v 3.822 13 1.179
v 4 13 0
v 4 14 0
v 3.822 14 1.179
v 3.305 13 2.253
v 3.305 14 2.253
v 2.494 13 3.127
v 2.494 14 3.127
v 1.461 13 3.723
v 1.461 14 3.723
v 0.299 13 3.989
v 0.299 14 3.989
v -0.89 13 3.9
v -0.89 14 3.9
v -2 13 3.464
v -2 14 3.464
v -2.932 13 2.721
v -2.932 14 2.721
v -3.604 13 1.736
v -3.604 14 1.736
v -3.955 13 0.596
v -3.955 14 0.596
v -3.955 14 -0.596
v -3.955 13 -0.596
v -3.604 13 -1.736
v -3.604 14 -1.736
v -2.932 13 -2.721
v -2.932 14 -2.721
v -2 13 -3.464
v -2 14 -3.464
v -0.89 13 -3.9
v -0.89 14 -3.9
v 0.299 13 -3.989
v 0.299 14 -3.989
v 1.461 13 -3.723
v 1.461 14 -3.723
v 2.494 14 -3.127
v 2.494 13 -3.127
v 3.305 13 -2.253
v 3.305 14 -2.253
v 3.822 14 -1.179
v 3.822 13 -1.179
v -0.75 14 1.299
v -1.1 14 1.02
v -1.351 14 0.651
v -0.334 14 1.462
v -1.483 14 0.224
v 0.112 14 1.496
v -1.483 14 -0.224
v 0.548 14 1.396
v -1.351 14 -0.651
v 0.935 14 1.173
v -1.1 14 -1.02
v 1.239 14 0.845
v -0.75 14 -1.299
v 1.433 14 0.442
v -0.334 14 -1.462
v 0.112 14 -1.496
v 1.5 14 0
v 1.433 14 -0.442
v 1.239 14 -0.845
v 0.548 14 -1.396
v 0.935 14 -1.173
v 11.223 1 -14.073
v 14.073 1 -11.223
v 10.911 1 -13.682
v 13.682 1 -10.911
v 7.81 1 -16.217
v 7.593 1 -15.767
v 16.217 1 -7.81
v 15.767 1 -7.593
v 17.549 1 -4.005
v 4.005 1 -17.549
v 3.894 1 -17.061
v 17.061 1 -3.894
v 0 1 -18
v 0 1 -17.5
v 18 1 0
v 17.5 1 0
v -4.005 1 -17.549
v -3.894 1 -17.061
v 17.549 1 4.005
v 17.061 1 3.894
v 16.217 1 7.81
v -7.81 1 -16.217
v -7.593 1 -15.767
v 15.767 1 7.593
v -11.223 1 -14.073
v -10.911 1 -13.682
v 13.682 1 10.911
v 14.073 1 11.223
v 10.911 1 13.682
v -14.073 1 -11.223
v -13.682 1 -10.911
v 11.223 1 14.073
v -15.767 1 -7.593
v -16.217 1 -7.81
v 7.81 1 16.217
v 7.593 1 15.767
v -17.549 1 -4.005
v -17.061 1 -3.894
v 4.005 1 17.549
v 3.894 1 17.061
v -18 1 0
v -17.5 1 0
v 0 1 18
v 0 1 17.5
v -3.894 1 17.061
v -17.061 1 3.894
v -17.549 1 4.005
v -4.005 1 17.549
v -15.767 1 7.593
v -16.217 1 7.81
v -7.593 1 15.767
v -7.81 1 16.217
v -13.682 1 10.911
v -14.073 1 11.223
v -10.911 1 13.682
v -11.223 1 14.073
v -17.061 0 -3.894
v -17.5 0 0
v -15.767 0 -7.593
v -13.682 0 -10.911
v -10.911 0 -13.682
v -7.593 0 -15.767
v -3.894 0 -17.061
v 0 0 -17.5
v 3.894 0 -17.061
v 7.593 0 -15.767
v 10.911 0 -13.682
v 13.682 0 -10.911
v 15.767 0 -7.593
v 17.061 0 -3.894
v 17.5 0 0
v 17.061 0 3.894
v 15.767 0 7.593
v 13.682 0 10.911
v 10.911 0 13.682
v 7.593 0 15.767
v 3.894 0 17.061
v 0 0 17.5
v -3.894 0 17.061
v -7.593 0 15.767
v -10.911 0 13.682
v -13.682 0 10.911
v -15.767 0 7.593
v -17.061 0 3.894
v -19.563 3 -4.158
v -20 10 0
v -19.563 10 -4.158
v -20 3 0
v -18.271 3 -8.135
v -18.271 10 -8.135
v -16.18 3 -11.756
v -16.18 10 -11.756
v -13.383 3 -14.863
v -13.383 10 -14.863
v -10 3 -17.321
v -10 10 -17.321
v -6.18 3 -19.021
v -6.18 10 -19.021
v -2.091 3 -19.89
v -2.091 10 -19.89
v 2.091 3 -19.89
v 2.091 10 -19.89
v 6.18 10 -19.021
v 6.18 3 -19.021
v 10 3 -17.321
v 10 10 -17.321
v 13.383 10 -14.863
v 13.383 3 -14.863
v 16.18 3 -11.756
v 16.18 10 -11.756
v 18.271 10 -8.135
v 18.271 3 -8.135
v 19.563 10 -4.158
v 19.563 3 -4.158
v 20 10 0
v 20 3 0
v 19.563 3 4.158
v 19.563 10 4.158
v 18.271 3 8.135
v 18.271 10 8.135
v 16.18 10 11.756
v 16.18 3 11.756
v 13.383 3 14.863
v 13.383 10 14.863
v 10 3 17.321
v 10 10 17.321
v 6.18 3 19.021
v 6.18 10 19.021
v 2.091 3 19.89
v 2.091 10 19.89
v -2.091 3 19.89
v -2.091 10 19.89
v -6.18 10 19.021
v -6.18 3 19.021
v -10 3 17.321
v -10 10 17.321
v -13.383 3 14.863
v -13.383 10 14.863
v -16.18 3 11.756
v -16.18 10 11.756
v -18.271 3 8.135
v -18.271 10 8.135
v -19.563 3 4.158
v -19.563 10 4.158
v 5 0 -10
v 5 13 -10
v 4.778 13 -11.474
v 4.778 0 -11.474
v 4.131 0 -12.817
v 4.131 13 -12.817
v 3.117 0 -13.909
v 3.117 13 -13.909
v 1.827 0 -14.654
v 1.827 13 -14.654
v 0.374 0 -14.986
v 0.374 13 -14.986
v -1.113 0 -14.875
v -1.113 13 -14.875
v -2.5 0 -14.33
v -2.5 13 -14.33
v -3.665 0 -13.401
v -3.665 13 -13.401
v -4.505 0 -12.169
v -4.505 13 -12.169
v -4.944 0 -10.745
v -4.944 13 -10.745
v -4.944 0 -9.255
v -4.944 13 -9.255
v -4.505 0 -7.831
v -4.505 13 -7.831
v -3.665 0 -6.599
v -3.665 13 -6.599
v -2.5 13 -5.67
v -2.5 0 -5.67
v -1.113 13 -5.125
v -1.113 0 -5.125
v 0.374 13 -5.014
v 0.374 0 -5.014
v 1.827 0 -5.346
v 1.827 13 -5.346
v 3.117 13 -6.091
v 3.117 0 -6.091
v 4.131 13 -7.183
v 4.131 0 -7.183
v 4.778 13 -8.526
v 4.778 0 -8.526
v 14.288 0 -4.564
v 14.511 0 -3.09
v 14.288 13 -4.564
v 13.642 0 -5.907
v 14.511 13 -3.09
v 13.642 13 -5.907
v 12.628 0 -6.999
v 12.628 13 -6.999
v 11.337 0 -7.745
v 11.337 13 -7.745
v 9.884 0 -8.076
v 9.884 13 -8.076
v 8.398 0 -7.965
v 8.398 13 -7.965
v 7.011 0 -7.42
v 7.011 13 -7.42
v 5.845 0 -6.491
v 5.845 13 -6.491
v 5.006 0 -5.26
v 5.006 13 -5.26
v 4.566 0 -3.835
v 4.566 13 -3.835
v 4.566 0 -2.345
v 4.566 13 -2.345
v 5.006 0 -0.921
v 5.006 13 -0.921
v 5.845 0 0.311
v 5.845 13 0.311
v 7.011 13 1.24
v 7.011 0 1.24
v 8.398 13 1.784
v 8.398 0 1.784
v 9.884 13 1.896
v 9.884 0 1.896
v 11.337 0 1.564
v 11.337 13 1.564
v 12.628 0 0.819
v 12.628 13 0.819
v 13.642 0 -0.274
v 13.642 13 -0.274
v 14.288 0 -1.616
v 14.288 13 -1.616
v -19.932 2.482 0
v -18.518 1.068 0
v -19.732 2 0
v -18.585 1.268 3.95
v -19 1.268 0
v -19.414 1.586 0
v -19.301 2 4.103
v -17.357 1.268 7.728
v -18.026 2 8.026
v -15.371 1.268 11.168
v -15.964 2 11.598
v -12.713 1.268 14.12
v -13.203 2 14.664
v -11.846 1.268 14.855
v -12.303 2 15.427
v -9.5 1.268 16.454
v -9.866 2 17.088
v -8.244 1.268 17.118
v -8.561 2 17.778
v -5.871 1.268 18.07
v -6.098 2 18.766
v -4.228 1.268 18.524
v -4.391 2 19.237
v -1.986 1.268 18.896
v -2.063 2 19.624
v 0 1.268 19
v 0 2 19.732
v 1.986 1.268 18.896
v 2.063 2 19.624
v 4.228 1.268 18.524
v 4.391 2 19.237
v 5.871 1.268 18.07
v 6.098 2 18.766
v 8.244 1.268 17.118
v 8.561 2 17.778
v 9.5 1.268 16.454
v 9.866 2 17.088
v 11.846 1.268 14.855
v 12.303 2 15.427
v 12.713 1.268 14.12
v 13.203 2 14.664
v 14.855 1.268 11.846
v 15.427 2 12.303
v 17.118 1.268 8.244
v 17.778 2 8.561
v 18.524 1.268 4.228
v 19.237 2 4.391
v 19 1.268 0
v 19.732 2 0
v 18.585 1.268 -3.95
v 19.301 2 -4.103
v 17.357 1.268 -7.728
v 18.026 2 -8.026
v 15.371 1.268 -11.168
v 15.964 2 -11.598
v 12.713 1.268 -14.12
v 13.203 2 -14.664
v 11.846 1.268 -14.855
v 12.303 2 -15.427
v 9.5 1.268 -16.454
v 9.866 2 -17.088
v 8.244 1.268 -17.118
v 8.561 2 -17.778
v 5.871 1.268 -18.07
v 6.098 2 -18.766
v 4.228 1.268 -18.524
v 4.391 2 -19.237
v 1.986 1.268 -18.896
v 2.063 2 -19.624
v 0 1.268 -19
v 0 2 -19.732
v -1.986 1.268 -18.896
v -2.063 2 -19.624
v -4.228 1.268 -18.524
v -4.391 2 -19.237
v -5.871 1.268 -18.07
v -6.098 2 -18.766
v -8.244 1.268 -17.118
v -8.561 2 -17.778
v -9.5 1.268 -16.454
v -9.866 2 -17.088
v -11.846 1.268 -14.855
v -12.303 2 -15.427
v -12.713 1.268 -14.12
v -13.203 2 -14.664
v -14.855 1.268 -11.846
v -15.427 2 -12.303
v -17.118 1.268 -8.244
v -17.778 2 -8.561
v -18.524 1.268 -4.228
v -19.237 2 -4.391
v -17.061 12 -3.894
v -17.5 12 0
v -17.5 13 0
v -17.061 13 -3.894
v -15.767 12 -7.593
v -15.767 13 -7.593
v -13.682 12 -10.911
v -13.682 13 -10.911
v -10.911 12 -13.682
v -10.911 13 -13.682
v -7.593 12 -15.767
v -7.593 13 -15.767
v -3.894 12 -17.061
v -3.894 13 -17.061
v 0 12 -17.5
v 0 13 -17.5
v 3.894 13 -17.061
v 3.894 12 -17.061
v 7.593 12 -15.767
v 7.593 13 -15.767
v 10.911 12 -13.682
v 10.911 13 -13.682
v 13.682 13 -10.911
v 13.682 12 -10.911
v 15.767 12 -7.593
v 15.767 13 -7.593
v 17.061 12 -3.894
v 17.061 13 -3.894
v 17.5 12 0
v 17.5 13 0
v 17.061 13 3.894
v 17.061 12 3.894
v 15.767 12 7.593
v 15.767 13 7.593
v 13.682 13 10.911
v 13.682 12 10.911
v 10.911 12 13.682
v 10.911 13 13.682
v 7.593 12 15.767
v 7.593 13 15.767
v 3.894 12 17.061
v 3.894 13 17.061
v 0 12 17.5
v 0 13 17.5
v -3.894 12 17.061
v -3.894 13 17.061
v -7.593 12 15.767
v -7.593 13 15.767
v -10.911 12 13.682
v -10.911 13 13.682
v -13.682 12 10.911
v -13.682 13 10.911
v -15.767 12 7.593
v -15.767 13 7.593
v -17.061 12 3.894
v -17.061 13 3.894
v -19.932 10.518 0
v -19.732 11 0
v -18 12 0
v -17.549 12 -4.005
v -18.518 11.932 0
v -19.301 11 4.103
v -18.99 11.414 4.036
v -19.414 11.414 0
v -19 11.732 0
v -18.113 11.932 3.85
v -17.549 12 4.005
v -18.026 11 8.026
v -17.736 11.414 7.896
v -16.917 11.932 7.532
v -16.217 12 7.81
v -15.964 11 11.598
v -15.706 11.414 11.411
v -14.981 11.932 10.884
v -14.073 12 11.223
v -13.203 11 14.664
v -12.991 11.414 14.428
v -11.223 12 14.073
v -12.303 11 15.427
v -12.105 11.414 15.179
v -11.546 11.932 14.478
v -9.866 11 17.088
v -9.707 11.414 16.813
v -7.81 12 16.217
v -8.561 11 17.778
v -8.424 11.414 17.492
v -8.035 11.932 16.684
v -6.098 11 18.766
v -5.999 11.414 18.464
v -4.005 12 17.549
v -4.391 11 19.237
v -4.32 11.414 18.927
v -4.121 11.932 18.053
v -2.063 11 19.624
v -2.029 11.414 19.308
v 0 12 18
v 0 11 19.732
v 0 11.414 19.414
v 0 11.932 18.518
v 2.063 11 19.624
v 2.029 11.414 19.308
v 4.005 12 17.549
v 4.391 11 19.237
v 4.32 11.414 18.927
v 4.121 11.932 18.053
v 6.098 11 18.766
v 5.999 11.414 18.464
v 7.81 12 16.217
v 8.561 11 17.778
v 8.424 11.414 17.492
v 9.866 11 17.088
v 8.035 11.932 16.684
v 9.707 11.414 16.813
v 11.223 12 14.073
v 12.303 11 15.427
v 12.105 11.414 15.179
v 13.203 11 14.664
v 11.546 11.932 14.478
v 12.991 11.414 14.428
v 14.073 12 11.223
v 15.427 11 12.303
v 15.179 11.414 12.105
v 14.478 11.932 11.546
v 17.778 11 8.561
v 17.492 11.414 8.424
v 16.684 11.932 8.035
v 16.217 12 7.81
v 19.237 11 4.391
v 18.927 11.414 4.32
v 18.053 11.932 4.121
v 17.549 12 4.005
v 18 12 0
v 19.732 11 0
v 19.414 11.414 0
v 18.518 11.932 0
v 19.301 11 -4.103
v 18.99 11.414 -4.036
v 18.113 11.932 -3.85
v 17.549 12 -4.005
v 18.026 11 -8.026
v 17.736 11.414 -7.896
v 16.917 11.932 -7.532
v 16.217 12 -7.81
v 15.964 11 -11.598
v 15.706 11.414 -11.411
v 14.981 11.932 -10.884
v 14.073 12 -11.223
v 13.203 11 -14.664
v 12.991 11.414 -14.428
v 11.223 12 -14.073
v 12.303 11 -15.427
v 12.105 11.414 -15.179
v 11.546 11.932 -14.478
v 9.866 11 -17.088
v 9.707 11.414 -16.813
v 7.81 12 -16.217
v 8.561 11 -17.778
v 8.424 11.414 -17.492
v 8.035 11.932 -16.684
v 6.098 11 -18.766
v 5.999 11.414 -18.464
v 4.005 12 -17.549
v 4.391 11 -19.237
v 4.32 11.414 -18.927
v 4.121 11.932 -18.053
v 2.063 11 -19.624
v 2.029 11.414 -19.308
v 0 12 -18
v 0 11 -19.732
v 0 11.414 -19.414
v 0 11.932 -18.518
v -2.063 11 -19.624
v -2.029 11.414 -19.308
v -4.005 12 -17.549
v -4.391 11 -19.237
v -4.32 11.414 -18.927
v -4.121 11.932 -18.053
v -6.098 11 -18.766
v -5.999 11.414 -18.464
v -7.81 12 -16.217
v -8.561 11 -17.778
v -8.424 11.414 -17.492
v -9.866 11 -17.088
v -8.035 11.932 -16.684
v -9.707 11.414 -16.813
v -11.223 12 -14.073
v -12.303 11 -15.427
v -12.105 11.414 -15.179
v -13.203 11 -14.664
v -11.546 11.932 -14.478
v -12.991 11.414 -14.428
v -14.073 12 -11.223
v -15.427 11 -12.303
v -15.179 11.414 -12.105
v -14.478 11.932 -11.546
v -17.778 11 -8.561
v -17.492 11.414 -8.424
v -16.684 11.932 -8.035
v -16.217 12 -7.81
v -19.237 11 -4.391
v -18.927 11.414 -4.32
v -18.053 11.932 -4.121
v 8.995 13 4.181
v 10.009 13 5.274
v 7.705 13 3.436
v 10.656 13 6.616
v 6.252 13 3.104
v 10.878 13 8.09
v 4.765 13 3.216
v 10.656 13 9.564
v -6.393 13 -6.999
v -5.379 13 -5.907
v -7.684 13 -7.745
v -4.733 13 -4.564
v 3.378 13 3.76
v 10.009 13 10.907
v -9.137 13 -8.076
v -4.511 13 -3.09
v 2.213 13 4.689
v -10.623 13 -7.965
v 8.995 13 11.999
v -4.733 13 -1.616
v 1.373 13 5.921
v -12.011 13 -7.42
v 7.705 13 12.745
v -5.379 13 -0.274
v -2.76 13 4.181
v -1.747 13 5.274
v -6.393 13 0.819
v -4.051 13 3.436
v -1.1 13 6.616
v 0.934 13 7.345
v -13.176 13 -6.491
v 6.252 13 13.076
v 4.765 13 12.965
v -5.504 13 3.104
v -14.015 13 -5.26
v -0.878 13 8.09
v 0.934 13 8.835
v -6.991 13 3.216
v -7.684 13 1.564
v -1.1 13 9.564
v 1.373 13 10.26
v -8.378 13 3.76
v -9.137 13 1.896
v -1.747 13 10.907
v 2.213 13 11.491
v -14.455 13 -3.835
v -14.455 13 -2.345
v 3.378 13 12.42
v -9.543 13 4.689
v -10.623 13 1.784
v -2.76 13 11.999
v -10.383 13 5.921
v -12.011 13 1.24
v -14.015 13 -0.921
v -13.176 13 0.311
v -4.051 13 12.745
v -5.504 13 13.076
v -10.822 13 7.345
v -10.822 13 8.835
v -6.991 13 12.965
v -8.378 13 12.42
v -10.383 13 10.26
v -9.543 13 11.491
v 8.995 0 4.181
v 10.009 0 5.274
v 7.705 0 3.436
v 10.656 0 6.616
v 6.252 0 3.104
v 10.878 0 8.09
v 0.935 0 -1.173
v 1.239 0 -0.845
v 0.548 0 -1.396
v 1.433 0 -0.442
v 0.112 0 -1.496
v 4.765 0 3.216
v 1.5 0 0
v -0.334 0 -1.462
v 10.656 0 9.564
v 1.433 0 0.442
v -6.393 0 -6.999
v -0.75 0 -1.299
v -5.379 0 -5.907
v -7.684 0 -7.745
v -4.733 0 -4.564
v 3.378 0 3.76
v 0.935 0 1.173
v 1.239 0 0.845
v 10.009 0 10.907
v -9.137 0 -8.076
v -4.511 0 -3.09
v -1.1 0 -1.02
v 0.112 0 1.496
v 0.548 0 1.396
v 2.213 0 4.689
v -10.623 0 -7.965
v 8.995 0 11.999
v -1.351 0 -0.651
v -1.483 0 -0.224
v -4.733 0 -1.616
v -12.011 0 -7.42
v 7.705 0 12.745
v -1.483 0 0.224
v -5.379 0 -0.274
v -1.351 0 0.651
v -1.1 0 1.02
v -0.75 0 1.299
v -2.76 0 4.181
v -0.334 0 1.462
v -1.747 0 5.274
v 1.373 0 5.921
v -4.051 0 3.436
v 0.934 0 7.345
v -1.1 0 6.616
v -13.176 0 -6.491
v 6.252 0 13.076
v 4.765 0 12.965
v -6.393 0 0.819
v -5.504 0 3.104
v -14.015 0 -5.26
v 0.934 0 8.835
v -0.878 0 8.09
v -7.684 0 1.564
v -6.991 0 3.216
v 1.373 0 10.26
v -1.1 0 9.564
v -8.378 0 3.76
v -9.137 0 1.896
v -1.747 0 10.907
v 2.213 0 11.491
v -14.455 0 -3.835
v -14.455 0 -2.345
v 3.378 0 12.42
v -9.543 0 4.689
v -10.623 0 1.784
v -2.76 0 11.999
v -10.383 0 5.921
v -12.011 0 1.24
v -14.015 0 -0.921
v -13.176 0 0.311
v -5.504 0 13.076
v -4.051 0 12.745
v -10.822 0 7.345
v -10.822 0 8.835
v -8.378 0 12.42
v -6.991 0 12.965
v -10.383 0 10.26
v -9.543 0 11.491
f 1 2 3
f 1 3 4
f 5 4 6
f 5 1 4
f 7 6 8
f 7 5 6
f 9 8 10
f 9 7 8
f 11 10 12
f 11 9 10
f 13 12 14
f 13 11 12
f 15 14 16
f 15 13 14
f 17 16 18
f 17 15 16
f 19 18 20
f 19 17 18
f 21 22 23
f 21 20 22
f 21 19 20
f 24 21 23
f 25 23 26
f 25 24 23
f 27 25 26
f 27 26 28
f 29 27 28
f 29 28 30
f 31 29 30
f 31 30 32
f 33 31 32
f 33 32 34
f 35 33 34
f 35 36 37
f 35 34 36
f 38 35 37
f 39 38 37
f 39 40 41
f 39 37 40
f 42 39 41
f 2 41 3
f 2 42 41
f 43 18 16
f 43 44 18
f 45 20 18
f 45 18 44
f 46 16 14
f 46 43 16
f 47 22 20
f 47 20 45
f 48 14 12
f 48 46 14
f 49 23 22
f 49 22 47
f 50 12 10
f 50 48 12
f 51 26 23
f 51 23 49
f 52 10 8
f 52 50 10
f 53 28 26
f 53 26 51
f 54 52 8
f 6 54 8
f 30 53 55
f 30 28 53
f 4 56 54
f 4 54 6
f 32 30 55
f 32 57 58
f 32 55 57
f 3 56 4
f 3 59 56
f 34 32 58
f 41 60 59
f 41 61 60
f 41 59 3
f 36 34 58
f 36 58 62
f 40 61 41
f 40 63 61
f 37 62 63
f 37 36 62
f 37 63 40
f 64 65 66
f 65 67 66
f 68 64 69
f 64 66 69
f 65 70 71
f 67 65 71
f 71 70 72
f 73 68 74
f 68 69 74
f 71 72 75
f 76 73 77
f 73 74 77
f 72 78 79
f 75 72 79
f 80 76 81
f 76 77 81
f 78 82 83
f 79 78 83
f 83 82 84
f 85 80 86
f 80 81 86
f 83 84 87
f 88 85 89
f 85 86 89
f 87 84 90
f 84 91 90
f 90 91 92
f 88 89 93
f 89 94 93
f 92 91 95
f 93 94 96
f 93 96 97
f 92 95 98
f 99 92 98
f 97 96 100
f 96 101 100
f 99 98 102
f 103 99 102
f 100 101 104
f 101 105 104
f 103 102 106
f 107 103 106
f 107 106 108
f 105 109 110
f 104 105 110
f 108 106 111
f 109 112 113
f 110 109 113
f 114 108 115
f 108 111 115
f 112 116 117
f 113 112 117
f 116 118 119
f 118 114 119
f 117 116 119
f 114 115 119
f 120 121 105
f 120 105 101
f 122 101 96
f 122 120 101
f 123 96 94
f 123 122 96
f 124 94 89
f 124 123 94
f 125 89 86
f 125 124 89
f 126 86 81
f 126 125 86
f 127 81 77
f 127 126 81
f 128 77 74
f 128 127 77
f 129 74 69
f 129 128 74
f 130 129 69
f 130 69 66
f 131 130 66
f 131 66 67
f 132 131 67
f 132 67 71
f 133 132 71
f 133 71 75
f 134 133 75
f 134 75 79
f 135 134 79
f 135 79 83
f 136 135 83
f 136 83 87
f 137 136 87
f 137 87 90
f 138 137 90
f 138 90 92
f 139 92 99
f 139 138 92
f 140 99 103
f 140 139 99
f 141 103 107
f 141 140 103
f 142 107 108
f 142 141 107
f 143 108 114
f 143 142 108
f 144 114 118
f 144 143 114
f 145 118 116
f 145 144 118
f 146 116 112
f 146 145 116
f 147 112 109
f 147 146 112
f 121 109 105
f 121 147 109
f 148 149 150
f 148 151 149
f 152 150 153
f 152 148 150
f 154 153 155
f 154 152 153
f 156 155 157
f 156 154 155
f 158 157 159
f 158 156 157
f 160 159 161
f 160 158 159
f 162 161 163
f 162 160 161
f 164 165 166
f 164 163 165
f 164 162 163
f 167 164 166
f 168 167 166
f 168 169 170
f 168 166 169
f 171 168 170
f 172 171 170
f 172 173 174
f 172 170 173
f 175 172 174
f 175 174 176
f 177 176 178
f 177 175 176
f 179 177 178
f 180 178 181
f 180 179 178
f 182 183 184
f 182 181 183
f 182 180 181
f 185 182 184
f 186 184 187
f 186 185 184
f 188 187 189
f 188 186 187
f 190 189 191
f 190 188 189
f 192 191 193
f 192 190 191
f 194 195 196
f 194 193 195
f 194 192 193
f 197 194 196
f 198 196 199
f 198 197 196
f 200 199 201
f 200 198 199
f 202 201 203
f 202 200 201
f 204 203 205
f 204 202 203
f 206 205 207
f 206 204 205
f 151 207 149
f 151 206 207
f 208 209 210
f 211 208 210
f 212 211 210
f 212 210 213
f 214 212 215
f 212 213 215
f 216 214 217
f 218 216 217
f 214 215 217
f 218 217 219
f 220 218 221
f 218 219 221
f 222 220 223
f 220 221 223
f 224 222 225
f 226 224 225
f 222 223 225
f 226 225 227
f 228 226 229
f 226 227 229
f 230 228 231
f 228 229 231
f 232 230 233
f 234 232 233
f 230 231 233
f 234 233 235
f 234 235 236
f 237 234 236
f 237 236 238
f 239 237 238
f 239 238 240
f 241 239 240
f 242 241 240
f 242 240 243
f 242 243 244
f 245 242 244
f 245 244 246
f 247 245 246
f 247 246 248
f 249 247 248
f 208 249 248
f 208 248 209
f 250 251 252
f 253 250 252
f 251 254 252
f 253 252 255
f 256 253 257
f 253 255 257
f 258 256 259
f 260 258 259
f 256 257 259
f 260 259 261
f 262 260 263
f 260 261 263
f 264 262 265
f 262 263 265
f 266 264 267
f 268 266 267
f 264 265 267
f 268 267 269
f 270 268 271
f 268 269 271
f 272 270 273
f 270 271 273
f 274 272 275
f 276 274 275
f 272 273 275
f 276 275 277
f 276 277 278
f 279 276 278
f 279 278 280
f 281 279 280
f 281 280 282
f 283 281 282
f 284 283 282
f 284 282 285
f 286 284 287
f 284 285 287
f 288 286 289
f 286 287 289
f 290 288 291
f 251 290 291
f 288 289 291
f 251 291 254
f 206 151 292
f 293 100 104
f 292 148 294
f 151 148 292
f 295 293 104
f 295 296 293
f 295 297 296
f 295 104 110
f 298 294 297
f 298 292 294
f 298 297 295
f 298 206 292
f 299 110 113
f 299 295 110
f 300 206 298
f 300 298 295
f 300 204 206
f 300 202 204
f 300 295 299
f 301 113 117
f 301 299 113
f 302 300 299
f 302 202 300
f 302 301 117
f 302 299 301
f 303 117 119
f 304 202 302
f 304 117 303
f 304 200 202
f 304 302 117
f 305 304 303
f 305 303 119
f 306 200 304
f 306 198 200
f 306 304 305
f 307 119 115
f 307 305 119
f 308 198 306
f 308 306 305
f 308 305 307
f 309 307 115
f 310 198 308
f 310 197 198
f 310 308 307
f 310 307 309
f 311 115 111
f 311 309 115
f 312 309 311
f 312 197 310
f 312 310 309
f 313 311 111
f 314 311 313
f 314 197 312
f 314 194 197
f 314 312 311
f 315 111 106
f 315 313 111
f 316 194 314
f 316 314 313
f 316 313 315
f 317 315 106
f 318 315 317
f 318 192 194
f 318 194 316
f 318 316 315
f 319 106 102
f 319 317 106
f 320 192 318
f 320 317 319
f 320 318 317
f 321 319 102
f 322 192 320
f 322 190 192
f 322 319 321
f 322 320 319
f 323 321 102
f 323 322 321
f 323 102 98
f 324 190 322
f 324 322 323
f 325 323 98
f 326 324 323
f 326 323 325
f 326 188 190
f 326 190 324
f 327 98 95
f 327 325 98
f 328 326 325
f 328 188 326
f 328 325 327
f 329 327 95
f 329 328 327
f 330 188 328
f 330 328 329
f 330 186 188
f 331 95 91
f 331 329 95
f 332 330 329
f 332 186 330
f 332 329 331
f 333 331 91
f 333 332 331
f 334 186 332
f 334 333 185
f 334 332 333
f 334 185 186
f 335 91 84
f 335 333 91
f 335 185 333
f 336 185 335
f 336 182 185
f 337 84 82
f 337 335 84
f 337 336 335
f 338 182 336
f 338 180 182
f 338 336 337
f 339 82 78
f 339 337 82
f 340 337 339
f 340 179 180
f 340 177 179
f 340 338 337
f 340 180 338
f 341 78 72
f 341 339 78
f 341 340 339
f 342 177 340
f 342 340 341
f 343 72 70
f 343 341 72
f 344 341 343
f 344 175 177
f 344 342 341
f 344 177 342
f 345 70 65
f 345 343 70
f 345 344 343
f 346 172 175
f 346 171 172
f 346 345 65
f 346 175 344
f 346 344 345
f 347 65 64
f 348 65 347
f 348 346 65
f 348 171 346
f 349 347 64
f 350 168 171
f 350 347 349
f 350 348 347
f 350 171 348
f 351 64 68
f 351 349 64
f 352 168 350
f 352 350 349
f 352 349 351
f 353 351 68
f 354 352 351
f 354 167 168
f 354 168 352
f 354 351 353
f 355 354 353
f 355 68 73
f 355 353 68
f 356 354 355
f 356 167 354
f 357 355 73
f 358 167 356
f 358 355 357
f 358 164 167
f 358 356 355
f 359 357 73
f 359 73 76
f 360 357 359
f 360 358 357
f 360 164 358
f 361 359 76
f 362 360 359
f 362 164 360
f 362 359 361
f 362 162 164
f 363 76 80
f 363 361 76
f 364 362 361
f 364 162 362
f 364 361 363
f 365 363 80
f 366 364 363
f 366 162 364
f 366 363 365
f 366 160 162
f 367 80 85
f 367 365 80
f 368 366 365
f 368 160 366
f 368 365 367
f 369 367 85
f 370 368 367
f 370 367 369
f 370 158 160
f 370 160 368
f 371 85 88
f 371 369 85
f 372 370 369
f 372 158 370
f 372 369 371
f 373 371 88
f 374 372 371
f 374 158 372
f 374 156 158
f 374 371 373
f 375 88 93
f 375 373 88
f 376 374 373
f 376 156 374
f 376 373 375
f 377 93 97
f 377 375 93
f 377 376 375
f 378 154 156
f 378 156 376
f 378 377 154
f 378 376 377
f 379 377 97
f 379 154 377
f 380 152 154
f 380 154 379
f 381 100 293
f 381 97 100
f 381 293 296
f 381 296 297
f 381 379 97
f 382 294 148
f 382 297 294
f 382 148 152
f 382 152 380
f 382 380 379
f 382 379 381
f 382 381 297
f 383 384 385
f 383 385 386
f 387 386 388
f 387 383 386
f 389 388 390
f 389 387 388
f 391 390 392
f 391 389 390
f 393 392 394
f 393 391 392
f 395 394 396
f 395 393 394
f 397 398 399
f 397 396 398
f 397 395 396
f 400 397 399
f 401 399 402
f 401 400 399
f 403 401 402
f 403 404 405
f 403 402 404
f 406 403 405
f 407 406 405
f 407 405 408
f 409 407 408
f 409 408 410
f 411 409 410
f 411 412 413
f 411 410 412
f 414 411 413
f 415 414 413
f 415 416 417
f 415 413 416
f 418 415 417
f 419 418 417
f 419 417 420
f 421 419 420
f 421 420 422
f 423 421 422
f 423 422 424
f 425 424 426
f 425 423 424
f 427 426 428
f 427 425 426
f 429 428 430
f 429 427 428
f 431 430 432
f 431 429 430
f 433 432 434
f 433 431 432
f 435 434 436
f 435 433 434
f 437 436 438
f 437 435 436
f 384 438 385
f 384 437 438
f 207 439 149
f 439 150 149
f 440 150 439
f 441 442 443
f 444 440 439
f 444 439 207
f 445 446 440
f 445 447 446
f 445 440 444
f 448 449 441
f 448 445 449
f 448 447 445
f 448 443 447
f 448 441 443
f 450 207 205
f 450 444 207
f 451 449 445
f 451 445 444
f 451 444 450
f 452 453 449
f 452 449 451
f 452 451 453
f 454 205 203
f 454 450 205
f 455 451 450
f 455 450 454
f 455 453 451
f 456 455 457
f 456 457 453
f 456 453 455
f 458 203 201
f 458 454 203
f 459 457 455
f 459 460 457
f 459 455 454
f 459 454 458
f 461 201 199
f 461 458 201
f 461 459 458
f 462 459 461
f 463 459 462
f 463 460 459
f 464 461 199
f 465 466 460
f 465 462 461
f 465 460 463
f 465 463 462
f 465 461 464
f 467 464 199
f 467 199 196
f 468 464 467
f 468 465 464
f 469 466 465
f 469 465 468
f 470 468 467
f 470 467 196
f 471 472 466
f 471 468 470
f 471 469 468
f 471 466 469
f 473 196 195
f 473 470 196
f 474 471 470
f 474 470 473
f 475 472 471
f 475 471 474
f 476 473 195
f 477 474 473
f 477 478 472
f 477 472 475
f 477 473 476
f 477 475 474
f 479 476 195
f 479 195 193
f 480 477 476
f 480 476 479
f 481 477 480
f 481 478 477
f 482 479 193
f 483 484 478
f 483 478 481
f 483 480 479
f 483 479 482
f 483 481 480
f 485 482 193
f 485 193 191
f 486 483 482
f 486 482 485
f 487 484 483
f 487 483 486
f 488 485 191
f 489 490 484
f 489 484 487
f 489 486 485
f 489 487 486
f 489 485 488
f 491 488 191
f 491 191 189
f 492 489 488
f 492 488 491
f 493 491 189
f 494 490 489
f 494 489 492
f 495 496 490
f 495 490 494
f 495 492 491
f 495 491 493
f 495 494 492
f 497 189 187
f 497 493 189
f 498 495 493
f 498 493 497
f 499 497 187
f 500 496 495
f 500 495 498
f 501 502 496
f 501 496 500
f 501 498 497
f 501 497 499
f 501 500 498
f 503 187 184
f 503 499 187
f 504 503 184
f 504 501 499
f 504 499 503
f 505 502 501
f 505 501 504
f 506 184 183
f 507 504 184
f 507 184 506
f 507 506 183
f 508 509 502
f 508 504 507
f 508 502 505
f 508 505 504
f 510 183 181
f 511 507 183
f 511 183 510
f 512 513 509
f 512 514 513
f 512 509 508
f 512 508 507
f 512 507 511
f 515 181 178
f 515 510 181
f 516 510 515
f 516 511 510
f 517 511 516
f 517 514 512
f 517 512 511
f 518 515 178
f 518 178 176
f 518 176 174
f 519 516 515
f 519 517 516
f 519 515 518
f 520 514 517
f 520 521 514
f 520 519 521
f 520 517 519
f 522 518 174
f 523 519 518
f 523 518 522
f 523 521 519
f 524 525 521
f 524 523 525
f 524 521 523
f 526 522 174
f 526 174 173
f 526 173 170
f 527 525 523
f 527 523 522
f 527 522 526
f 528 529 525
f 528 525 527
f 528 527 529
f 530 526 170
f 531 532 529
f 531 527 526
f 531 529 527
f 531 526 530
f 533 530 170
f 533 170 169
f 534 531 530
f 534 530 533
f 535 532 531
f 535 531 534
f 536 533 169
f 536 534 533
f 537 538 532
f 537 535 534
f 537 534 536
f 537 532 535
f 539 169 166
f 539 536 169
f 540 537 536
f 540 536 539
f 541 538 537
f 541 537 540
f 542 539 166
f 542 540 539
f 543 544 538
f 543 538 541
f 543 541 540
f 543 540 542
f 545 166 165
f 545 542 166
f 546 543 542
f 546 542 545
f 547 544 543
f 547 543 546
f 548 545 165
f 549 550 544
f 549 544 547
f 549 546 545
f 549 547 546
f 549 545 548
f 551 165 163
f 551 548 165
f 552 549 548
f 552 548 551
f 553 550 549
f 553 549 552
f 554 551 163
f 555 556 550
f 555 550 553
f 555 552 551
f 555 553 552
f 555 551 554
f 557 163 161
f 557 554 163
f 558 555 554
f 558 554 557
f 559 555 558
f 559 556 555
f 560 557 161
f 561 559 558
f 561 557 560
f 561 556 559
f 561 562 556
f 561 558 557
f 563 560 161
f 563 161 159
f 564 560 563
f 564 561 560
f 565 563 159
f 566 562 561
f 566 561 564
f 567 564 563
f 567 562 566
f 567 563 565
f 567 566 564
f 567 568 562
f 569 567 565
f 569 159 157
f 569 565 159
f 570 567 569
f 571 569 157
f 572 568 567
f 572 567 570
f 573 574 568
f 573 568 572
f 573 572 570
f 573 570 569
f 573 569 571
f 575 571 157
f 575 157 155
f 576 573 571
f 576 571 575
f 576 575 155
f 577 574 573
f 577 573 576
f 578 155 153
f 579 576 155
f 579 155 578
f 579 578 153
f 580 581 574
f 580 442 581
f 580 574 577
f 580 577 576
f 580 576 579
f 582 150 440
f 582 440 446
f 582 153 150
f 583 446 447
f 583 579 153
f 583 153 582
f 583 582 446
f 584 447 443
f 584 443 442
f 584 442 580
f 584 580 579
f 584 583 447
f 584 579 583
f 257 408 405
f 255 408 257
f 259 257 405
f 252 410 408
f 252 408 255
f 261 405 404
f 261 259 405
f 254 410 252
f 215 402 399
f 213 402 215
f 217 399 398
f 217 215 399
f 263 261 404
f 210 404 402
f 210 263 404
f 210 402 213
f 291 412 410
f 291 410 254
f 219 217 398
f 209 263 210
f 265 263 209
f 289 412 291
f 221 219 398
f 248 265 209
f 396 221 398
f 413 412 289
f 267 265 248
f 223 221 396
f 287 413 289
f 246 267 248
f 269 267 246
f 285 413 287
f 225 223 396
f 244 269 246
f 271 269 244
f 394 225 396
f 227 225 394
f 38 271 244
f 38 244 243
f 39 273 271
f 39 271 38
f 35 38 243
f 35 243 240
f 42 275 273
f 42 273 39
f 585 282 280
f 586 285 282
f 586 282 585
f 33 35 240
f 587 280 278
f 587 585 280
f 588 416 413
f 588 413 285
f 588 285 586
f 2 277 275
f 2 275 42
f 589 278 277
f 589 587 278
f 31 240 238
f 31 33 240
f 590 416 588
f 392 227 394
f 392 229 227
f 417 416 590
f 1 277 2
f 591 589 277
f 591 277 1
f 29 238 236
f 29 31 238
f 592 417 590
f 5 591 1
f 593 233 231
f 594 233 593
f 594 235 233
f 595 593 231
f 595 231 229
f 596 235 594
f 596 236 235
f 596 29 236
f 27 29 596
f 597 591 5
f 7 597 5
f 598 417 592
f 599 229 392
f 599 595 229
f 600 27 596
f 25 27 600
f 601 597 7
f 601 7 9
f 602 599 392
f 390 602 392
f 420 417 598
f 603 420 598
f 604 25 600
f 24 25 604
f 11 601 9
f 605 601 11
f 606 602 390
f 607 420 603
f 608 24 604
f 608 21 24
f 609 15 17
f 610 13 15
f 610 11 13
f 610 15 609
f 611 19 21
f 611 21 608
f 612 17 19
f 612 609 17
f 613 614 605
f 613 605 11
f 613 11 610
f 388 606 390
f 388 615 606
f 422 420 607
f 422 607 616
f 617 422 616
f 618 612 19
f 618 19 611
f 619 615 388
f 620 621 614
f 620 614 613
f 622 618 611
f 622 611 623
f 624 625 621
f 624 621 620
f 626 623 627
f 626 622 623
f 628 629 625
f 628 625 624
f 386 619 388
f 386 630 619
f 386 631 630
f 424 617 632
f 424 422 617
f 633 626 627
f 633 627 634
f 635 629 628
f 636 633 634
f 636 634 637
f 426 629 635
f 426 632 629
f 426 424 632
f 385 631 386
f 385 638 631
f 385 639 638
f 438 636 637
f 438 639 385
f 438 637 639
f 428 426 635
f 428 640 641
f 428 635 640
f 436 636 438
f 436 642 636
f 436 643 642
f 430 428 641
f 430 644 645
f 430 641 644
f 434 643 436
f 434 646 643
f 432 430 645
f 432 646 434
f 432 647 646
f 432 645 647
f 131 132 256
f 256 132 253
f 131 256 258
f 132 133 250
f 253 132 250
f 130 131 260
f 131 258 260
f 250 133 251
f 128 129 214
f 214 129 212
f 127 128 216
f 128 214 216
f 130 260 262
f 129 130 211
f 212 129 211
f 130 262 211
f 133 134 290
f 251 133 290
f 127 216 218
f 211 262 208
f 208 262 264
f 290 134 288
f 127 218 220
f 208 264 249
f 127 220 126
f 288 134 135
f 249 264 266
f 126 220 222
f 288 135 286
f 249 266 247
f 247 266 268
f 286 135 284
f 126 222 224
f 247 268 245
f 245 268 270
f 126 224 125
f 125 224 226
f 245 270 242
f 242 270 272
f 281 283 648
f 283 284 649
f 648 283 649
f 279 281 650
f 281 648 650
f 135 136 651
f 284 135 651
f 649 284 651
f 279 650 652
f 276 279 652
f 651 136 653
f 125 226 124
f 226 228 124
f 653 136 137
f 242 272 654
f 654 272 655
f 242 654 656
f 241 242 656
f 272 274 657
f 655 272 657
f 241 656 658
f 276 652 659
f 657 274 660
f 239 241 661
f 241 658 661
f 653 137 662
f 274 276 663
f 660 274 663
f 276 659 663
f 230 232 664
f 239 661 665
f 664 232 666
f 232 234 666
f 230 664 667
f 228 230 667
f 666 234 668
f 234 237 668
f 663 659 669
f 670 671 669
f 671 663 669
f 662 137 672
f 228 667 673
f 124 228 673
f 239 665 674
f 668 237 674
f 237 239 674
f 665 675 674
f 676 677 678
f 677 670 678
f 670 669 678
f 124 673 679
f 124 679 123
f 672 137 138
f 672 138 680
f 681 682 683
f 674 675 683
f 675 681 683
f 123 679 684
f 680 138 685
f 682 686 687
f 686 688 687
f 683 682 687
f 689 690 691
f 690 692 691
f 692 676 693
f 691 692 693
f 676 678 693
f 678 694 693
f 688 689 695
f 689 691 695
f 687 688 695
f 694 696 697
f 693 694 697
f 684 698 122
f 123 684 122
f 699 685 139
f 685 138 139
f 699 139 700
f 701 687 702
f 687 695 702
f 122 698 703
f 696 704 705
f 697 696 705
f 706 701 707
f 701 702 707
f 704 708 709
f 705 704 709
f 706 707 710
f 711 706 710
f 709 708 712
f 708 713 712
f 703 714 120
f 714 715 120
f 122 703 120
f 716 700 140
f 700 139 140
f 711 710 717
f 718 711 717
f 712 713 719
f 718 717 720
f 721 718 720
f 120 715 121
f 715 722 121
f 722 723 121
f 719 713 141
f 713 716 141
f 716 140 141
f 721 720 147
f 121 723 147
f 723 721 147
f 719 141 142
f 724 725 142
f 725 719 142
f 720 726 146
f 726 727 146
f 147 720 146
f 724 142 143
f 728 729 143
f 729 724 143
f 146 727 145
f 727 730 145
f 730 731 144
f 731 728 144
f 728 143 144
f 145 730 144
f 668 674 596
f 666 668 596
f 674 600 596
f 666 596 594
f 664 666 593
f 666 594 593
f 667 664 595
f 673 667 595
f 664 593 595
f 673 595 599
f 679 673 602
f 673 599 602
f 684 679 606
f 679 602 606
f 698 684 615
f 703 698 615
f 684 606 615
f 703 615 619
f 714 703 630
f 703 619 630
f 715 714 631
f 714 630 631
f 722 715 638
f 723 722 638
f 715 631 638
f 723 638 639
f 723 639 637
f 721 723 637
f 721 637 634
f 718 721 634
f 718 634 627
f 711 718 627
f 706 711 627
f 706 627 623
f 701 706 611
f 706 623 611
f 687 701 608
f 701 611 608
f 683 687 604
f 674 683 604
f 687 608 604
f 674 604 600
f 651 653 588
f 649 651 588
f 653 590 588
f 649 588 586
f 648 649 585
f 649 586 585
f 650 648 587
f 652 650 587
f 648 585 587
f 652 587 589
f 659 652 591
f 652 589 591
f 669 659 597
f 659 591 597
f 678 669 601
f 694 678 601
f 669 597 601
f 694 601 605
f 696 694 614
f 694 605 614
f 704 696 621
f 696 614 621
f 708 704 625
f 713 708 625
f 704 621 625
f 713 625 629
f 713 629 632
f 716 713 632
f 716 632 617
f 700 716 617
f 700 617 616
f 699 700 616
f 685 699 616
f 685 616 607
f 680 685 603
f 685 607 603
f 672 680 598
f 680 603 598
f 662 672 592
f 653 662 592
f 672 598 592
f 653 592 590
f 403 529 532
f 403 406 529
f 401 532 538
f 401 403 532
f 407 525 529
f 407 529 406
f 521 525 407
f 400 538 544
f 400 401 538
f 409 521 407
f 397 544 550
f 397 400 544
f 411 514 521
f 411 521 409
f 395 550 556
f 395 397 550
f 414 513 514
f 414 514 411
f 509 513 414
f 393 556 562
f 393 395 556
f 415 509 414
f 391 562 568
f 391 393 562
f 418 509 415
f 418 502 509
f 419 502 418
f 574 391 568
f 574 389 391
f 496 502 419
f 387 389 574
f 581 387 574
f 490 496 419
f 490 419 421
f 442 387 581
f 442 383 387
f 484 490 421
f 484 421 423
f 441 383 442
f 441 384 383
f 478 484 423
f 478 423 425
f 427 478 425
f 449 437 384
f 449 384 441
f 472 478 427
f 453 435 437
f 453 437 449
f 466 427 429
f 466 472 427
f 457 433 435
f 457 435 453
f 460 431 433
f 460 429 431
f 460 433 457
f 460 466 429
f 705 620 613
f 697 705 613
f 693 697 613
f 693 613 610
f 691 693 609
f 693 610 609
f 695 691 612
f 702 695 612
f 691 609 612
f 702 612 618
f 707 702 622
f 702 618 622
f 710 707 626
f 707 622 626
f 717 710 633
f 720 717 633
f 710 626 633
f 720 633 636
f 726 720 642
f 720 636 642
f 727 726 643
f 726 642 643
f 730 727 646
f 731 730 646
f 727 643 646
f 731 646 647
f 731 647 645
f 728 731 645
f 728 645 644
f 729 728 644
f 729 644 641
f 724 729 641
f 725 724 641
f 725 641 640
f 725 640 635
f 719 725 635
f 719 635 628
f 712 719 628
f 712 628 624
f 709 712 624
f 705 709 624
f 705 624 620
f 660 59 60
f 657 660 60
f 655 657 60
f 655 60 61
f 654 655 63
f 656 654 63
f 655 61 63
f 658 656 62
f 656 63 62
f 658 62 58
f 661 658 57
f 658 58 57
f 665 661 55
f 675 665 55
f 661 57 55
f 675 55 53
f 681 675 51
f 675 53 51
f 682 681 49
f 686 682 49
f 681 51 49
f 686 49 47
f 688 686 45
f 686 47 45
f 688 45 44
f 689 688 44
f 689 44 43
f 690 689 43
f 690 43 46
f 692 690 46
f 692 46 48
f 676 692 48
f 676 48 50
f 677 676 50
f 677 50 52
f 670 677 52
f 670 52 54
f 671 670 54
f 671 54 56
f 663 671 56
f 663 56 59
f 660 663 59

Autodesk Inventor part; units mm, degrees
ref_plane "YZ Plane" through (0, 0, 0) normal (1, 0, 0) x (0, 1, 0)
ref_plane "XY Plane" through (0, 0, 0) normal (0, 0, 1) x (1, 0, 0)
sketch "Boceto1" plane through (0, 0, 0) normal (0, 1, 0) x (-1, 0, 0)
  circle A0 centre (0, 0) radius 17.5
  dimension "d0" = 35
extrude "Extrusión1" add sketch "Boceto1" along normal blind 13
sketch "Boceto2" plane through (0, 13, 0) normal (0, 1, 0) x (1, 0, 0)
  circle A0 centre (0, 0) radius 17.5 projected
  circle A1 centre (0, 0) radius 4
  circle A2 centre (0, 10) radius 5
  circle A3 centre (-9.5106, 3.0902) radius 5
  circle A4 centre (-5.8779, -8.0902) radius 5
  circle A5 centre (5.8779, -8.0902) radius 5
  circle A6 centre (9.5106, 3.0902) radius 5
  circle A7 centre (0, 0) radius 17.5 projected
  dimension "d3" = 8
  dimension "d4" = 10
  dimension "d5" = 10
  dimension "d8" = 360
extrude "Extrusión2" add sketch "Boceto2" along normal blind 1 contours A1
extrude "Extrusión3" cut sketch "Boceto2" against normal blind 15 contours A2 | A3 | A4 | A5 | A6
sketch "Boceto3" plane through (0, 14, 0) normal (0, 1, 0) x (1, 0, 0)
  circle A0 centre (0, 0) radius 1.5
  dimension "d14" = 3
extrude "Extrusión4" cut sketch "Boceto3" against normal blind 15
ref_plane "Plano de trabajo1" through (0, 1, 0) normal (0, 1, 0) x (-1, 0, 0)
sketch "Boceto4" plane through (0, 1, 0) normal (0, 1, 0) x (-1, 0, 0)
  circle A0 centre (5.8779, 8.0902) radius 5 projected
  circle A1 centre (-9.5106, -3.0902) radius 5 projected
  circle A2 centre (9.5106, -3.0902) radius 5 projected
  circle A3 centre (0, -10) radius 5 projected
  circle A4 centre (-5.8779, 8.0902) radius 5 projected
  circle A5 centre (0, 0) radius 4 projected
  circle A6 centre (0, 0) radius 17.5 projected
  circle A7 centre (0, 0) radius 20
  dimension "d18" = 40
extrude "Extrusión5" add sketch "Boceto4" along normal blind 11 contours A7
fillet "Empalme1" radius 2 2 edges at (20, 12, 0) (20, 1, 0)
properties part number "Rueda" material "Caucho, butilo(1)"
